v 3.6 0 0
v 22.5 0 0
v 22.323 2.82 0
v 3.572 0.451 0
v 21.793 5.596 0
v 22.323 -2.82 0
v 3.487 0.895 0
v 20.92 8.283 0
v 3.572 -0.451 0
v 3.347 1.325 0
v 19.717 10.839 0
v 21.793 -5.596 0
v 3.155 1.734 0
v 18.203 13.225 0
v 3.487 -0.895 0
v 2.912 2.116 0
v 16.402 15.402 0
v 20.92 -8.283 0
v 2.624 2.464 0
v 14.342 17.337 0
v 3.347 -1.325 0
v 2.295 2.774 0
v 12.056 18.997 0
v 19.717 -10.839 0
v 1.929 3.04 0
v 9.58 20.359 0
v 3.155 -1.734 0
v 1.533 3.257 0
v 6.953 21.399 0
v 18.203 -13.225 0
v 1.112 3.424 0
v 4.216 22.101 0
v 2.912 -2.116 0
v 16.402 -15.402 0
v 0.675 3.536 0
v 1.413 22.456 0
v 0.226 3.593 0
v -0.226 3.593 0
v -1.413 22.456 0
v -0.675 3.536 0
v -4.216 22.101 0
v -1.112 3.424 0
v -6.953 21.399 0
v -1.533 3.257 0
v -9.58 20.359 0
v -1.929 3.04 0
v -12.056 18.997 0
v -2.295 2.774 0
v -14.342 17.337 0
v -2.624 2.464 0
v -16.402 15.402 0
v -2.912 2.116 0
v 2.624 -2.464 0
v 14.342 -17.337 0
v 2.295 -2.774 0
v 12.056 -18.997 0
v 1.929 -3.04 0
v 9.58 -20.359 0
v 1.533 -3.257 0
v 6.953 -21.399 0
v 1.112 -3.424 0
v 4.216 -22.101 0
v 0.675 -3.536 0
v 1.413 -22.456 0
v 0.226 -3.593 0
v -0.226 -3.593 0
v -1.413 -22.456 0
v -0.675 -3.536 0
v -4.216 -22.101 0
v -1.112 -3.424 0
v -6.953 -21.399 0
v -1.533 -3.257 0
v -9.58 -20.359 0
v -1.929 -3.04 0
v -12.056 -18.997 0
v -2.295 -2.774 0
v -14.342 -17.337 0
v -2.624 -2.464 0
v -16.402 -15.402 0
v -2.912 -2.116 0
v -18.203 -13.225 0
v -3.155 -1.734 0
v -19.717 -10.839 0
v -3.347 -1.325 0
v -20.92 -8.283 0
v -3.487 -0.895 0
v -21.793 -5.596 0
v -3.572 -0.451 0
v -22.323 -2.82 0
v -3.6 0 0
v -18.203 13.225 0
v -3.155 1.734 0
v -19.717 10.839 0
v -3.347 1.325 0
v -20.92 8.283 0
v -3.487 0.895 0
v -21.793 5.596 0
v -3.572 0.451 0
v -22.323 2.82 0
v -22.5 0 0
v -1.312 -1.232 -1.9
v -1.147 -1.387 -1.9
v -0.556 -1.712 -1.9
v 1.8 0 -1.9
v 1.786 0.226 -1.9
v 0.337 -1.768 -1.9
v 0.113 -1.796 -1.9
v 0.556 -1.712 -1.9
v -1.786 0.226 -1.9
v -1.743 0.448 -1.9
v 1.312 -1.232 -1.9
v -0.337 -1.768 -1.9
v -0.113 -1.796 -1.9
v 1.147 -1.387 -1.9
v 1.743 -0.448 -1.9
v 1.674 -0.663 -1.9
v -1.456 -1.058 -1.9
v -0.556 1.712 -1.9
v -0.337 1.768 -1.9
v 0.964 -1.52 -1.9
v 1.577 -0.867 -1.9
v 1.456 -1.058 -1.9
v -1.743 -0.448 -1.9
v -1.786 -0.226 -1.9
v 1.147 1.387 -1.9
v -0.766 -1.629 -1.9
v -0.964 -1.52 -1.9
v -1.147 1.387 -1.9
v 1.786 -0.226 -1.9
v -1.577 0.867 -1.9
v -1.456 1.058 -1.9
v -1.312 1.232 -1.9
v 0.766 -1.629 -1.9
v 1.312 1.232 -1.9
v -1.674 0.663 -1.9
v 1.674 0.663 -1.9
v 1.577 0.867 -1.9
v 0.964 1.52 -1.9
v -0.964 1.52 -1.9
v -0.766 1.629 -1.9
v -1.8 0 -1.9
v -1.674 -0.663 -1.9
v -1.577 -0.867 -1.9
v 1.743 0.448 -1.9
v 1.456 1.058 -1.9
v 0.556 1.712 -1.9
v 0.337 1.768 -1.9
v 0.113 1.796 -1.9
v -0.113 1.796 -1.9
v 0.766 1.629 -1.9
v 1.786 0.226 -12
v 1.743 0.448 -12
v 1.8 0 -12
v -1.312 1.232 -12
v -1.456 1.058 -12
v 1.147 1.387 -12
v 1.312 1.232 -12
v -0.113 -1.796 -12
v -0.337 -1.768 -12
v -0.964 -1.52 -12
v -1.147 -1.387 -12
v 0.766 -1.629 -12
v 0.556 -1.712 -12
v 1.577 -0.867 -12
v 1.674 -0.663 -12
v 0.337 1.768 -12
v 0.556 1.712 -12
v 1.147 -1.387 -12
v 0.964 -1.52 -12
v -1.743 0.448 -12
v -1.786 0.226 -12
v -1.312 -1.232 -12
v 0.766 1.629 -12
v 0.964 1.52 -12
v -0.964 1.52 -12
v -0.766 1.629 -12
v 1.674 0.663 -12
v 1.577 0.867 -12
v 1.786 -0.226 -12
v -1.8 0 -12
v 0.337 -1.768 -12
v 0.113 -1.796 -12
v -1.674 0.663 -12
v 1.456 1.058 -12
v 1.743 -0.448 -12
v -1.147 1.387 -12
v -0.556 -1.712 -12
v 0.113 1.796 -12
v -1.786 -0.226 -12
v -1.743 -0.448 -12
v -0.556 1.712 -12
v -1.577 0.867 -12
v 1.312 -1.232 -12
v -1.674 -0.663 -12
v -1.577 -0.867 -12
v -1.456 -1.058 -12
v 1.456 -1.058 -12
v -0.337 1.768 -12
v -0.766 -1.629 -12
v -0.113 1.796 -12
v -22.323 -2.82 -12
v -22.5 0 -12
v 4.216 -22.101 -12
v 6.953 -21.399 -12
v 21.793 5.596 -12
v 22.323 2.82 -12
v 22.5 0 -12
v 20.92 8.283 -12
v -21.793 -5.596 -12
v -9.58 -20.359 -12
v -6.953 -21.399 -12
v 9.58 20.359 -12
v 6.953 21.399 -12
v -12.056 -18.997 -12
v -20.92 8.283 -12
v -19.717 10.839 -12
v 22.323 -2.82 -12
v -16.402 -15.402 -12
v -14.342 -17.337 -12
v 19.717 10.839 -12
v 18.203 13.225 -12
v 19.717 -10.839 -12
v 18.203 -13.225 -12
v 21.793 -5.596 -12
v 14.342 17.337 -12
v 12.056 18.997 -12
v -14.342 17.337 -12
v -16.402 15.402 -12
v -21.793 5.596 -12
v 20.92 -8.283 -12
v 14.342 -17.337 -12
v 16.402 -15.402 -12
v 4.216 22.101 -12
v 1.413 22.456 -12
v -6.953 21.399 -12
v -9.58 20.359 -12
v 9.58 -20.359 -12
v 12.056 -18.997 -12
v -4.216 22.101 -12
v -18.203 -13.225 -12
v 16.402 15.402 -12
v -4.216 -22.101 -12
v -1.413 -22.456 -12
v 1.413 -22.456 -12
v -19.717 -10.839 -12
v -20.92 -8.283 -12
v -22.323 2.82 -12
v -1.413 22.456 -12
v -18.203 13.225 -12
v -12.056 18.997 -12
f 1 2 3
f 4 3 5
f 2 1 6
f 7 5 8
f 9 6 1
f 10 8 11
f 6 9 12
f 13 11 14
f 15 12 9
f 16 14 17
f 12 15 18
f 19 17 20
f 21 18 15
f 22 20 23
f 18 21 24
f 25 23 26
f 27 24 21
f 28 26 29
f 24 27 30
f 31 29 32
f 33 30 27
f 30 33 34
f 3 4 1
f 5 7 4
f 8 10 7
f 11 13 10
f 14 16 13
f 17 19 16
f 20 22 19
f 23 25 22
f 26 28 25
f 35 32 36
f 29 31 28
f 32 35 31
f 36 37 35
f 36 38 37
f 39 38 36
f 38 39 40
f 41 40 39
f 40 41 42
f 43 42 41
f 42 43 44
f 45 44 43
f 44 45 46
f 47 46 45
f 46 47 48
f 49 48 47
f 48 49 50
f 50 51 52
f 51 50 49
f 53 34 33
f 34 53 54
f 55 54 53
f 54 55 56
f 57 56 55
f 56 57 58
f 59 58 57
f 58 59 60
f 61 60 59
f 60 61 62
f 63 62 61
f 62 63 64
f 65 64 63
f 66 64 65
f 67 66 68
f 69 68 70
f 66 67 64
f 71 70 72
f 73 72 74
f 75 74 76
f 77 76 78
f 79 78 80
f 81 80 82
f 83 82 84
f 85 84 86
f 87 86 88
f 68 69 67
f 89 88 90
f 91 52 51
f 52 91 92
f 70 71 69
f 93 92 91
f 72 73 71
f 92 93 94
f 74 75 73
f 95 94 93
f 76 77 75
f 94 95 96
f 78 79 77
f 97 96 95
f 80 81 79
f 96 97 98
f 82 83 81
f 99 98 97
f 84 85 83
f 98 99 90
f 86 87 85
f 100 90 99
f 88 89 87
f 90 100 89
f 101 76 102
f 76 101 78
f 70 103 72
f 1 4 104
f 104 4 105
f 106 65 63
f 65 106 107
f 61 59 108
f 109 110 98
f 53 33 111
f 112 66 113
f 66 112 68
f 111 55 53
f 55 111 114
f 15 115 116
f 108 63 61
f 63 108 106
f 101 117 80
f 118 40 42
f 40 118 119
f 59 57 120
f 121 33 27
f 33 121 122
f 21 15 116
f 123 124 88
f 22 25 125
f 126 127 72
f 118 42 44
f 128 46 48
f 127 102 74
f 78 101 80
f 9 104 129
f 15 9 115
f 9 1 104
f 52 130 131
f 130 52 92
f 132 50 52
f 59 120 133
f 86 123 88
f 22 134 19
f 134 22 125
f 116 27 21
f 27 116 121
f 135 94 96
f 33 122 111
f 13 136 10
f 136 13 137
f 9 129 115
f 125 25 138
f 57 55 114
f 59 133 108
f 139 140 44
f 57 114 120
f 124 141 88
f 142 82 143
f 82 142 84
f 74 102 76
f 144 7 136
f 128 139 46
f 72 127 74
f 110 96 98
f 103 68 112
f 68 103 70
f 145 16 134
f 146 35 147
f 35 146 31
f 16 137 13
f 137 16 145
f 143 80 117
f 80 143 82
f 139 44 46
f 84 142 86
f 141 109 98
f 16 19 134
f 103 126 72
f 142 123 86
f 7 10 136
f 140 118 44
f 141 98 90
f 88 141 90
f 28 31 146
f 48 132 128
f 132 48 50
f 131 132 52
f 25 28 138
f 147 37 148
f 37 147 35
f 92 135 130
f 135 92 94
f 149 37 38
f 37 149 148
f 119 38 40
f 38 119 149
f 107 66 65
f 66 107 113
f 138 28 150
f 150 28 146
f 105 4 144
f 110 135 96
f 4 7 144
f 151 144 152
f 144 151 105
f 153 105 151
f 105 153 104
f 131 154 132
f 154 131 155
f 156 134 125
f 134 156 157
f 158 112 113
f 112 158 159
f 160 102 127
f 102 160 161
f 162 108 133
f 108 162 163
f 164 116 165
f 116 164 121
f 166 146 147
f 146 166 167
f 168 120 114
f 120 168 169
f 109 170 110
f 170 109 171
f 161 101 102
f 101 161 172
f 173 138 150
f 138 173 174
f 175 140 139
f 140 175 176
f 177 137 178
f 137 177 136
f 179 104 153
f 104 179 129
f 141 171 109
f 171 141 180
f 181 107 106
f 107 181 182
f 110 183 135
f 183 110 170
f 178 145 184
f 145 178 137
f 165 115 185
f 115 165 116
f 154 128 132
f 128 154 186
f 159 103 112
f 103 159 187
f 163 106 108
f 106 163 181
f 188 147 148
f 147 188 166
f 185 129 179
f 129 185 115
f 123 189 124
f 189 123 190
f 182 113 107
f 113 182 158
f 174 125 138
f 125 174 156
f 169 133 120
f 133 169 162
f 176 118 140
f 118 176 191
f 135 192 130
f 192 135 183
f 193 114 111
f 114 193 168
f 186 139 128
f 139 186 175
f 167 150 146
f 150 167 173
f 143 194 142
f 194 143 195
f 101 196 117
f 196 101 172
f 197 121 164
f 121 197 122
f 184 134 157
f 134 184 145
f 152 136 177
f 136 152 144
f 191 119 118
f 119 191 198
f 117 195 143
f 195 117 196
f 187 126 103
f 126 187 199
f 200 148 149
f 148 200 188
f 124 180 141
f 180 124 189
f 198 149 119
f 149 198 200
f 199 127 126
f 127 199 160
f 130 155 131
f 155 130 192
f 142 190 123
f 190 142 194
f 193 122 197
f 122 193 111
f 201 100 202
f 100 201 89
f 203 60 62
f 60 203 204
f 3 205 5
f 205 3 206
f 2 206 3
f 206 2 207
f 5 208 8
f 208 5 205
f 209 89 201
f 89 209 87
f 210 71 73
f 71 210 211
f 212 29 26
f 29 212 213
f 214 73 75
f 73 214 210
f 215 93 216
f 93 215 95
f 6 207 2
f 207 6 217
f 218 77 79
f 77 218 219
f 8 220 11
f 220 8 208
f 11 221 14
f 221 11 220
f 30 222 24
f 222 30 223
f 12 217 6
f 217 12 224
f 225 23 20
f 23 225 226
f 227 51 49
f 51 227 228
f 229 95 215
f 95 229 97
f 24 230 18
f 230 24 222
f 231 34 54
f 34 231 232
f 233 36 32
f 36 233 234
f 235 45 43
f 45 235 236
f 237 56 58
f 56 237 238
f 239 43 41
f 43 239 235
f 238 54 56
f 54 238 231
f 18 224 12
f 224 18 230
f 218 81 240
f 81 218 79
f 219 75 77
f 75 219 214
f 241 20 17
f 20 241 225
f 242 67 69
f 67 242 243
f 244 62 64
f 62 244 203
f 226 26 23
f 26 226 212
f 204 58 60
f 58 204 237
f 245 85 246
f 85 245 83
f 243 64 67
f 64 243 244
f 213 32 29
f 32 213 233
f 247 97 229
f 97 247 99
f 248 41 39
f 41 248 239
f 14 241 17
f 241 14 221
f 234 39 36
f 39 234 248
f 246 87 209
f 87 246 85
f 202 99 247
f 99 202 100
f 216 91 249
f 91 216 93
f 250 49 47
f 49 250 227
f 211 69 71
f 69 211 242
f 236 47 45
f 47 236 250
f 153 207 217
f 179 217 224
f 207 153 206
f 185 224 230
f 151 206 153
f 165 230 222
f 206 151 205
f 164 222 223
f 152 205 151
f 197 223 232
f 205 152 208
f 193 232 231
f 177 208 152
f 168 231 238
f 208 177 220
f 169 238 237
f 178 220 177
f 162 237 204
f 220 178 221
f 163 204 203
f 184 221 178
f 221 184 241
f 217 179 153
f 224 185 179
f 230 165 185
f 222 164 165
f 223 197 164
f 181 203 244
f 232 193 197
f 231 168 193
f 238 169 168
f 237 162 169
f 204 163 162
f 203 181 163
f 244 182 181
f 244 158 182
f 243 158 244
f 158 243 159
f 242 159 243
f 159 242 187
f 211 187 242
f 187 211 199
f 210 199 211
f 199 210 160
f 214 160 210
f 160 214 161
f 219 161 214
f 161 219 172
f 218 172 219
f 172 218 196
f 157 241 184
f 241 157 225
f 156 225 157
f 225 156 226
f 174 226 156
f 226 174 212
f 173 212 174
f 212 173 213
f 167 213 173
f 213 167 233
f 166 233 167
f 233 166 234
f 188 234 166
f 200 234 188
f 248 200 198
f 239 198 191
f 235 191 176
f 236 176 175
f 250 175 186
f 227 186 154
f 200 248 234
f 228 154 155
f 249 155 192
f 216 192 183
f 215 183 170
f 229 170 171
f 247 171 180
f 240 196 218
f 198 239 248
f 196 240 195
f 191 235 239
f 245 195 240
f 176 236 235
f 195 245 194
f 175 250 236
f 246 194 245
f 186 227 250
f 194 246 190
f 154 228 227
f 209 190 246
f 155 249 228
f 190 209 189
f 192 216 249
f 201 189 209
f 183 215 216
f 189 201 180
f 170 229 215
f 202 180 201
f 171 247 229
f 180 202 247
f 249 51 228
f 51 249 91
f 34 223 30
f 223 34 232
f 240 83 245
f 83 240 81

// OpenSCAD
$fn = 50;

difference() {
	union() {
		translate(v = [0, 0, -12.0]) {
			cylinder(h = 12, r = 22.5);
		}
	}
	union() {
		translate(v = [0, 0, 0]) {
			rotate(a = [0, 0, 0]) {
				difference() {
					union() {
						translate(v = [0, 0, -15.0]) {
							cylinder(h = 15, r = 1.5);
						}
						translate(v = [0, 0, -1.9]) {
							cylinder(h = 1.9, r1 = 1.8, r2 = 3.6);
						}
						translate(v = [0, 0, -15.0]) {
							cylinder(h = 15, r = 1.8);
						}
						translate(v = [0, 0, -15.0]) {
							cylinder(h = 15, r = 1.5);
						}
					}
					union();
				}
			}
		}
	}
}
